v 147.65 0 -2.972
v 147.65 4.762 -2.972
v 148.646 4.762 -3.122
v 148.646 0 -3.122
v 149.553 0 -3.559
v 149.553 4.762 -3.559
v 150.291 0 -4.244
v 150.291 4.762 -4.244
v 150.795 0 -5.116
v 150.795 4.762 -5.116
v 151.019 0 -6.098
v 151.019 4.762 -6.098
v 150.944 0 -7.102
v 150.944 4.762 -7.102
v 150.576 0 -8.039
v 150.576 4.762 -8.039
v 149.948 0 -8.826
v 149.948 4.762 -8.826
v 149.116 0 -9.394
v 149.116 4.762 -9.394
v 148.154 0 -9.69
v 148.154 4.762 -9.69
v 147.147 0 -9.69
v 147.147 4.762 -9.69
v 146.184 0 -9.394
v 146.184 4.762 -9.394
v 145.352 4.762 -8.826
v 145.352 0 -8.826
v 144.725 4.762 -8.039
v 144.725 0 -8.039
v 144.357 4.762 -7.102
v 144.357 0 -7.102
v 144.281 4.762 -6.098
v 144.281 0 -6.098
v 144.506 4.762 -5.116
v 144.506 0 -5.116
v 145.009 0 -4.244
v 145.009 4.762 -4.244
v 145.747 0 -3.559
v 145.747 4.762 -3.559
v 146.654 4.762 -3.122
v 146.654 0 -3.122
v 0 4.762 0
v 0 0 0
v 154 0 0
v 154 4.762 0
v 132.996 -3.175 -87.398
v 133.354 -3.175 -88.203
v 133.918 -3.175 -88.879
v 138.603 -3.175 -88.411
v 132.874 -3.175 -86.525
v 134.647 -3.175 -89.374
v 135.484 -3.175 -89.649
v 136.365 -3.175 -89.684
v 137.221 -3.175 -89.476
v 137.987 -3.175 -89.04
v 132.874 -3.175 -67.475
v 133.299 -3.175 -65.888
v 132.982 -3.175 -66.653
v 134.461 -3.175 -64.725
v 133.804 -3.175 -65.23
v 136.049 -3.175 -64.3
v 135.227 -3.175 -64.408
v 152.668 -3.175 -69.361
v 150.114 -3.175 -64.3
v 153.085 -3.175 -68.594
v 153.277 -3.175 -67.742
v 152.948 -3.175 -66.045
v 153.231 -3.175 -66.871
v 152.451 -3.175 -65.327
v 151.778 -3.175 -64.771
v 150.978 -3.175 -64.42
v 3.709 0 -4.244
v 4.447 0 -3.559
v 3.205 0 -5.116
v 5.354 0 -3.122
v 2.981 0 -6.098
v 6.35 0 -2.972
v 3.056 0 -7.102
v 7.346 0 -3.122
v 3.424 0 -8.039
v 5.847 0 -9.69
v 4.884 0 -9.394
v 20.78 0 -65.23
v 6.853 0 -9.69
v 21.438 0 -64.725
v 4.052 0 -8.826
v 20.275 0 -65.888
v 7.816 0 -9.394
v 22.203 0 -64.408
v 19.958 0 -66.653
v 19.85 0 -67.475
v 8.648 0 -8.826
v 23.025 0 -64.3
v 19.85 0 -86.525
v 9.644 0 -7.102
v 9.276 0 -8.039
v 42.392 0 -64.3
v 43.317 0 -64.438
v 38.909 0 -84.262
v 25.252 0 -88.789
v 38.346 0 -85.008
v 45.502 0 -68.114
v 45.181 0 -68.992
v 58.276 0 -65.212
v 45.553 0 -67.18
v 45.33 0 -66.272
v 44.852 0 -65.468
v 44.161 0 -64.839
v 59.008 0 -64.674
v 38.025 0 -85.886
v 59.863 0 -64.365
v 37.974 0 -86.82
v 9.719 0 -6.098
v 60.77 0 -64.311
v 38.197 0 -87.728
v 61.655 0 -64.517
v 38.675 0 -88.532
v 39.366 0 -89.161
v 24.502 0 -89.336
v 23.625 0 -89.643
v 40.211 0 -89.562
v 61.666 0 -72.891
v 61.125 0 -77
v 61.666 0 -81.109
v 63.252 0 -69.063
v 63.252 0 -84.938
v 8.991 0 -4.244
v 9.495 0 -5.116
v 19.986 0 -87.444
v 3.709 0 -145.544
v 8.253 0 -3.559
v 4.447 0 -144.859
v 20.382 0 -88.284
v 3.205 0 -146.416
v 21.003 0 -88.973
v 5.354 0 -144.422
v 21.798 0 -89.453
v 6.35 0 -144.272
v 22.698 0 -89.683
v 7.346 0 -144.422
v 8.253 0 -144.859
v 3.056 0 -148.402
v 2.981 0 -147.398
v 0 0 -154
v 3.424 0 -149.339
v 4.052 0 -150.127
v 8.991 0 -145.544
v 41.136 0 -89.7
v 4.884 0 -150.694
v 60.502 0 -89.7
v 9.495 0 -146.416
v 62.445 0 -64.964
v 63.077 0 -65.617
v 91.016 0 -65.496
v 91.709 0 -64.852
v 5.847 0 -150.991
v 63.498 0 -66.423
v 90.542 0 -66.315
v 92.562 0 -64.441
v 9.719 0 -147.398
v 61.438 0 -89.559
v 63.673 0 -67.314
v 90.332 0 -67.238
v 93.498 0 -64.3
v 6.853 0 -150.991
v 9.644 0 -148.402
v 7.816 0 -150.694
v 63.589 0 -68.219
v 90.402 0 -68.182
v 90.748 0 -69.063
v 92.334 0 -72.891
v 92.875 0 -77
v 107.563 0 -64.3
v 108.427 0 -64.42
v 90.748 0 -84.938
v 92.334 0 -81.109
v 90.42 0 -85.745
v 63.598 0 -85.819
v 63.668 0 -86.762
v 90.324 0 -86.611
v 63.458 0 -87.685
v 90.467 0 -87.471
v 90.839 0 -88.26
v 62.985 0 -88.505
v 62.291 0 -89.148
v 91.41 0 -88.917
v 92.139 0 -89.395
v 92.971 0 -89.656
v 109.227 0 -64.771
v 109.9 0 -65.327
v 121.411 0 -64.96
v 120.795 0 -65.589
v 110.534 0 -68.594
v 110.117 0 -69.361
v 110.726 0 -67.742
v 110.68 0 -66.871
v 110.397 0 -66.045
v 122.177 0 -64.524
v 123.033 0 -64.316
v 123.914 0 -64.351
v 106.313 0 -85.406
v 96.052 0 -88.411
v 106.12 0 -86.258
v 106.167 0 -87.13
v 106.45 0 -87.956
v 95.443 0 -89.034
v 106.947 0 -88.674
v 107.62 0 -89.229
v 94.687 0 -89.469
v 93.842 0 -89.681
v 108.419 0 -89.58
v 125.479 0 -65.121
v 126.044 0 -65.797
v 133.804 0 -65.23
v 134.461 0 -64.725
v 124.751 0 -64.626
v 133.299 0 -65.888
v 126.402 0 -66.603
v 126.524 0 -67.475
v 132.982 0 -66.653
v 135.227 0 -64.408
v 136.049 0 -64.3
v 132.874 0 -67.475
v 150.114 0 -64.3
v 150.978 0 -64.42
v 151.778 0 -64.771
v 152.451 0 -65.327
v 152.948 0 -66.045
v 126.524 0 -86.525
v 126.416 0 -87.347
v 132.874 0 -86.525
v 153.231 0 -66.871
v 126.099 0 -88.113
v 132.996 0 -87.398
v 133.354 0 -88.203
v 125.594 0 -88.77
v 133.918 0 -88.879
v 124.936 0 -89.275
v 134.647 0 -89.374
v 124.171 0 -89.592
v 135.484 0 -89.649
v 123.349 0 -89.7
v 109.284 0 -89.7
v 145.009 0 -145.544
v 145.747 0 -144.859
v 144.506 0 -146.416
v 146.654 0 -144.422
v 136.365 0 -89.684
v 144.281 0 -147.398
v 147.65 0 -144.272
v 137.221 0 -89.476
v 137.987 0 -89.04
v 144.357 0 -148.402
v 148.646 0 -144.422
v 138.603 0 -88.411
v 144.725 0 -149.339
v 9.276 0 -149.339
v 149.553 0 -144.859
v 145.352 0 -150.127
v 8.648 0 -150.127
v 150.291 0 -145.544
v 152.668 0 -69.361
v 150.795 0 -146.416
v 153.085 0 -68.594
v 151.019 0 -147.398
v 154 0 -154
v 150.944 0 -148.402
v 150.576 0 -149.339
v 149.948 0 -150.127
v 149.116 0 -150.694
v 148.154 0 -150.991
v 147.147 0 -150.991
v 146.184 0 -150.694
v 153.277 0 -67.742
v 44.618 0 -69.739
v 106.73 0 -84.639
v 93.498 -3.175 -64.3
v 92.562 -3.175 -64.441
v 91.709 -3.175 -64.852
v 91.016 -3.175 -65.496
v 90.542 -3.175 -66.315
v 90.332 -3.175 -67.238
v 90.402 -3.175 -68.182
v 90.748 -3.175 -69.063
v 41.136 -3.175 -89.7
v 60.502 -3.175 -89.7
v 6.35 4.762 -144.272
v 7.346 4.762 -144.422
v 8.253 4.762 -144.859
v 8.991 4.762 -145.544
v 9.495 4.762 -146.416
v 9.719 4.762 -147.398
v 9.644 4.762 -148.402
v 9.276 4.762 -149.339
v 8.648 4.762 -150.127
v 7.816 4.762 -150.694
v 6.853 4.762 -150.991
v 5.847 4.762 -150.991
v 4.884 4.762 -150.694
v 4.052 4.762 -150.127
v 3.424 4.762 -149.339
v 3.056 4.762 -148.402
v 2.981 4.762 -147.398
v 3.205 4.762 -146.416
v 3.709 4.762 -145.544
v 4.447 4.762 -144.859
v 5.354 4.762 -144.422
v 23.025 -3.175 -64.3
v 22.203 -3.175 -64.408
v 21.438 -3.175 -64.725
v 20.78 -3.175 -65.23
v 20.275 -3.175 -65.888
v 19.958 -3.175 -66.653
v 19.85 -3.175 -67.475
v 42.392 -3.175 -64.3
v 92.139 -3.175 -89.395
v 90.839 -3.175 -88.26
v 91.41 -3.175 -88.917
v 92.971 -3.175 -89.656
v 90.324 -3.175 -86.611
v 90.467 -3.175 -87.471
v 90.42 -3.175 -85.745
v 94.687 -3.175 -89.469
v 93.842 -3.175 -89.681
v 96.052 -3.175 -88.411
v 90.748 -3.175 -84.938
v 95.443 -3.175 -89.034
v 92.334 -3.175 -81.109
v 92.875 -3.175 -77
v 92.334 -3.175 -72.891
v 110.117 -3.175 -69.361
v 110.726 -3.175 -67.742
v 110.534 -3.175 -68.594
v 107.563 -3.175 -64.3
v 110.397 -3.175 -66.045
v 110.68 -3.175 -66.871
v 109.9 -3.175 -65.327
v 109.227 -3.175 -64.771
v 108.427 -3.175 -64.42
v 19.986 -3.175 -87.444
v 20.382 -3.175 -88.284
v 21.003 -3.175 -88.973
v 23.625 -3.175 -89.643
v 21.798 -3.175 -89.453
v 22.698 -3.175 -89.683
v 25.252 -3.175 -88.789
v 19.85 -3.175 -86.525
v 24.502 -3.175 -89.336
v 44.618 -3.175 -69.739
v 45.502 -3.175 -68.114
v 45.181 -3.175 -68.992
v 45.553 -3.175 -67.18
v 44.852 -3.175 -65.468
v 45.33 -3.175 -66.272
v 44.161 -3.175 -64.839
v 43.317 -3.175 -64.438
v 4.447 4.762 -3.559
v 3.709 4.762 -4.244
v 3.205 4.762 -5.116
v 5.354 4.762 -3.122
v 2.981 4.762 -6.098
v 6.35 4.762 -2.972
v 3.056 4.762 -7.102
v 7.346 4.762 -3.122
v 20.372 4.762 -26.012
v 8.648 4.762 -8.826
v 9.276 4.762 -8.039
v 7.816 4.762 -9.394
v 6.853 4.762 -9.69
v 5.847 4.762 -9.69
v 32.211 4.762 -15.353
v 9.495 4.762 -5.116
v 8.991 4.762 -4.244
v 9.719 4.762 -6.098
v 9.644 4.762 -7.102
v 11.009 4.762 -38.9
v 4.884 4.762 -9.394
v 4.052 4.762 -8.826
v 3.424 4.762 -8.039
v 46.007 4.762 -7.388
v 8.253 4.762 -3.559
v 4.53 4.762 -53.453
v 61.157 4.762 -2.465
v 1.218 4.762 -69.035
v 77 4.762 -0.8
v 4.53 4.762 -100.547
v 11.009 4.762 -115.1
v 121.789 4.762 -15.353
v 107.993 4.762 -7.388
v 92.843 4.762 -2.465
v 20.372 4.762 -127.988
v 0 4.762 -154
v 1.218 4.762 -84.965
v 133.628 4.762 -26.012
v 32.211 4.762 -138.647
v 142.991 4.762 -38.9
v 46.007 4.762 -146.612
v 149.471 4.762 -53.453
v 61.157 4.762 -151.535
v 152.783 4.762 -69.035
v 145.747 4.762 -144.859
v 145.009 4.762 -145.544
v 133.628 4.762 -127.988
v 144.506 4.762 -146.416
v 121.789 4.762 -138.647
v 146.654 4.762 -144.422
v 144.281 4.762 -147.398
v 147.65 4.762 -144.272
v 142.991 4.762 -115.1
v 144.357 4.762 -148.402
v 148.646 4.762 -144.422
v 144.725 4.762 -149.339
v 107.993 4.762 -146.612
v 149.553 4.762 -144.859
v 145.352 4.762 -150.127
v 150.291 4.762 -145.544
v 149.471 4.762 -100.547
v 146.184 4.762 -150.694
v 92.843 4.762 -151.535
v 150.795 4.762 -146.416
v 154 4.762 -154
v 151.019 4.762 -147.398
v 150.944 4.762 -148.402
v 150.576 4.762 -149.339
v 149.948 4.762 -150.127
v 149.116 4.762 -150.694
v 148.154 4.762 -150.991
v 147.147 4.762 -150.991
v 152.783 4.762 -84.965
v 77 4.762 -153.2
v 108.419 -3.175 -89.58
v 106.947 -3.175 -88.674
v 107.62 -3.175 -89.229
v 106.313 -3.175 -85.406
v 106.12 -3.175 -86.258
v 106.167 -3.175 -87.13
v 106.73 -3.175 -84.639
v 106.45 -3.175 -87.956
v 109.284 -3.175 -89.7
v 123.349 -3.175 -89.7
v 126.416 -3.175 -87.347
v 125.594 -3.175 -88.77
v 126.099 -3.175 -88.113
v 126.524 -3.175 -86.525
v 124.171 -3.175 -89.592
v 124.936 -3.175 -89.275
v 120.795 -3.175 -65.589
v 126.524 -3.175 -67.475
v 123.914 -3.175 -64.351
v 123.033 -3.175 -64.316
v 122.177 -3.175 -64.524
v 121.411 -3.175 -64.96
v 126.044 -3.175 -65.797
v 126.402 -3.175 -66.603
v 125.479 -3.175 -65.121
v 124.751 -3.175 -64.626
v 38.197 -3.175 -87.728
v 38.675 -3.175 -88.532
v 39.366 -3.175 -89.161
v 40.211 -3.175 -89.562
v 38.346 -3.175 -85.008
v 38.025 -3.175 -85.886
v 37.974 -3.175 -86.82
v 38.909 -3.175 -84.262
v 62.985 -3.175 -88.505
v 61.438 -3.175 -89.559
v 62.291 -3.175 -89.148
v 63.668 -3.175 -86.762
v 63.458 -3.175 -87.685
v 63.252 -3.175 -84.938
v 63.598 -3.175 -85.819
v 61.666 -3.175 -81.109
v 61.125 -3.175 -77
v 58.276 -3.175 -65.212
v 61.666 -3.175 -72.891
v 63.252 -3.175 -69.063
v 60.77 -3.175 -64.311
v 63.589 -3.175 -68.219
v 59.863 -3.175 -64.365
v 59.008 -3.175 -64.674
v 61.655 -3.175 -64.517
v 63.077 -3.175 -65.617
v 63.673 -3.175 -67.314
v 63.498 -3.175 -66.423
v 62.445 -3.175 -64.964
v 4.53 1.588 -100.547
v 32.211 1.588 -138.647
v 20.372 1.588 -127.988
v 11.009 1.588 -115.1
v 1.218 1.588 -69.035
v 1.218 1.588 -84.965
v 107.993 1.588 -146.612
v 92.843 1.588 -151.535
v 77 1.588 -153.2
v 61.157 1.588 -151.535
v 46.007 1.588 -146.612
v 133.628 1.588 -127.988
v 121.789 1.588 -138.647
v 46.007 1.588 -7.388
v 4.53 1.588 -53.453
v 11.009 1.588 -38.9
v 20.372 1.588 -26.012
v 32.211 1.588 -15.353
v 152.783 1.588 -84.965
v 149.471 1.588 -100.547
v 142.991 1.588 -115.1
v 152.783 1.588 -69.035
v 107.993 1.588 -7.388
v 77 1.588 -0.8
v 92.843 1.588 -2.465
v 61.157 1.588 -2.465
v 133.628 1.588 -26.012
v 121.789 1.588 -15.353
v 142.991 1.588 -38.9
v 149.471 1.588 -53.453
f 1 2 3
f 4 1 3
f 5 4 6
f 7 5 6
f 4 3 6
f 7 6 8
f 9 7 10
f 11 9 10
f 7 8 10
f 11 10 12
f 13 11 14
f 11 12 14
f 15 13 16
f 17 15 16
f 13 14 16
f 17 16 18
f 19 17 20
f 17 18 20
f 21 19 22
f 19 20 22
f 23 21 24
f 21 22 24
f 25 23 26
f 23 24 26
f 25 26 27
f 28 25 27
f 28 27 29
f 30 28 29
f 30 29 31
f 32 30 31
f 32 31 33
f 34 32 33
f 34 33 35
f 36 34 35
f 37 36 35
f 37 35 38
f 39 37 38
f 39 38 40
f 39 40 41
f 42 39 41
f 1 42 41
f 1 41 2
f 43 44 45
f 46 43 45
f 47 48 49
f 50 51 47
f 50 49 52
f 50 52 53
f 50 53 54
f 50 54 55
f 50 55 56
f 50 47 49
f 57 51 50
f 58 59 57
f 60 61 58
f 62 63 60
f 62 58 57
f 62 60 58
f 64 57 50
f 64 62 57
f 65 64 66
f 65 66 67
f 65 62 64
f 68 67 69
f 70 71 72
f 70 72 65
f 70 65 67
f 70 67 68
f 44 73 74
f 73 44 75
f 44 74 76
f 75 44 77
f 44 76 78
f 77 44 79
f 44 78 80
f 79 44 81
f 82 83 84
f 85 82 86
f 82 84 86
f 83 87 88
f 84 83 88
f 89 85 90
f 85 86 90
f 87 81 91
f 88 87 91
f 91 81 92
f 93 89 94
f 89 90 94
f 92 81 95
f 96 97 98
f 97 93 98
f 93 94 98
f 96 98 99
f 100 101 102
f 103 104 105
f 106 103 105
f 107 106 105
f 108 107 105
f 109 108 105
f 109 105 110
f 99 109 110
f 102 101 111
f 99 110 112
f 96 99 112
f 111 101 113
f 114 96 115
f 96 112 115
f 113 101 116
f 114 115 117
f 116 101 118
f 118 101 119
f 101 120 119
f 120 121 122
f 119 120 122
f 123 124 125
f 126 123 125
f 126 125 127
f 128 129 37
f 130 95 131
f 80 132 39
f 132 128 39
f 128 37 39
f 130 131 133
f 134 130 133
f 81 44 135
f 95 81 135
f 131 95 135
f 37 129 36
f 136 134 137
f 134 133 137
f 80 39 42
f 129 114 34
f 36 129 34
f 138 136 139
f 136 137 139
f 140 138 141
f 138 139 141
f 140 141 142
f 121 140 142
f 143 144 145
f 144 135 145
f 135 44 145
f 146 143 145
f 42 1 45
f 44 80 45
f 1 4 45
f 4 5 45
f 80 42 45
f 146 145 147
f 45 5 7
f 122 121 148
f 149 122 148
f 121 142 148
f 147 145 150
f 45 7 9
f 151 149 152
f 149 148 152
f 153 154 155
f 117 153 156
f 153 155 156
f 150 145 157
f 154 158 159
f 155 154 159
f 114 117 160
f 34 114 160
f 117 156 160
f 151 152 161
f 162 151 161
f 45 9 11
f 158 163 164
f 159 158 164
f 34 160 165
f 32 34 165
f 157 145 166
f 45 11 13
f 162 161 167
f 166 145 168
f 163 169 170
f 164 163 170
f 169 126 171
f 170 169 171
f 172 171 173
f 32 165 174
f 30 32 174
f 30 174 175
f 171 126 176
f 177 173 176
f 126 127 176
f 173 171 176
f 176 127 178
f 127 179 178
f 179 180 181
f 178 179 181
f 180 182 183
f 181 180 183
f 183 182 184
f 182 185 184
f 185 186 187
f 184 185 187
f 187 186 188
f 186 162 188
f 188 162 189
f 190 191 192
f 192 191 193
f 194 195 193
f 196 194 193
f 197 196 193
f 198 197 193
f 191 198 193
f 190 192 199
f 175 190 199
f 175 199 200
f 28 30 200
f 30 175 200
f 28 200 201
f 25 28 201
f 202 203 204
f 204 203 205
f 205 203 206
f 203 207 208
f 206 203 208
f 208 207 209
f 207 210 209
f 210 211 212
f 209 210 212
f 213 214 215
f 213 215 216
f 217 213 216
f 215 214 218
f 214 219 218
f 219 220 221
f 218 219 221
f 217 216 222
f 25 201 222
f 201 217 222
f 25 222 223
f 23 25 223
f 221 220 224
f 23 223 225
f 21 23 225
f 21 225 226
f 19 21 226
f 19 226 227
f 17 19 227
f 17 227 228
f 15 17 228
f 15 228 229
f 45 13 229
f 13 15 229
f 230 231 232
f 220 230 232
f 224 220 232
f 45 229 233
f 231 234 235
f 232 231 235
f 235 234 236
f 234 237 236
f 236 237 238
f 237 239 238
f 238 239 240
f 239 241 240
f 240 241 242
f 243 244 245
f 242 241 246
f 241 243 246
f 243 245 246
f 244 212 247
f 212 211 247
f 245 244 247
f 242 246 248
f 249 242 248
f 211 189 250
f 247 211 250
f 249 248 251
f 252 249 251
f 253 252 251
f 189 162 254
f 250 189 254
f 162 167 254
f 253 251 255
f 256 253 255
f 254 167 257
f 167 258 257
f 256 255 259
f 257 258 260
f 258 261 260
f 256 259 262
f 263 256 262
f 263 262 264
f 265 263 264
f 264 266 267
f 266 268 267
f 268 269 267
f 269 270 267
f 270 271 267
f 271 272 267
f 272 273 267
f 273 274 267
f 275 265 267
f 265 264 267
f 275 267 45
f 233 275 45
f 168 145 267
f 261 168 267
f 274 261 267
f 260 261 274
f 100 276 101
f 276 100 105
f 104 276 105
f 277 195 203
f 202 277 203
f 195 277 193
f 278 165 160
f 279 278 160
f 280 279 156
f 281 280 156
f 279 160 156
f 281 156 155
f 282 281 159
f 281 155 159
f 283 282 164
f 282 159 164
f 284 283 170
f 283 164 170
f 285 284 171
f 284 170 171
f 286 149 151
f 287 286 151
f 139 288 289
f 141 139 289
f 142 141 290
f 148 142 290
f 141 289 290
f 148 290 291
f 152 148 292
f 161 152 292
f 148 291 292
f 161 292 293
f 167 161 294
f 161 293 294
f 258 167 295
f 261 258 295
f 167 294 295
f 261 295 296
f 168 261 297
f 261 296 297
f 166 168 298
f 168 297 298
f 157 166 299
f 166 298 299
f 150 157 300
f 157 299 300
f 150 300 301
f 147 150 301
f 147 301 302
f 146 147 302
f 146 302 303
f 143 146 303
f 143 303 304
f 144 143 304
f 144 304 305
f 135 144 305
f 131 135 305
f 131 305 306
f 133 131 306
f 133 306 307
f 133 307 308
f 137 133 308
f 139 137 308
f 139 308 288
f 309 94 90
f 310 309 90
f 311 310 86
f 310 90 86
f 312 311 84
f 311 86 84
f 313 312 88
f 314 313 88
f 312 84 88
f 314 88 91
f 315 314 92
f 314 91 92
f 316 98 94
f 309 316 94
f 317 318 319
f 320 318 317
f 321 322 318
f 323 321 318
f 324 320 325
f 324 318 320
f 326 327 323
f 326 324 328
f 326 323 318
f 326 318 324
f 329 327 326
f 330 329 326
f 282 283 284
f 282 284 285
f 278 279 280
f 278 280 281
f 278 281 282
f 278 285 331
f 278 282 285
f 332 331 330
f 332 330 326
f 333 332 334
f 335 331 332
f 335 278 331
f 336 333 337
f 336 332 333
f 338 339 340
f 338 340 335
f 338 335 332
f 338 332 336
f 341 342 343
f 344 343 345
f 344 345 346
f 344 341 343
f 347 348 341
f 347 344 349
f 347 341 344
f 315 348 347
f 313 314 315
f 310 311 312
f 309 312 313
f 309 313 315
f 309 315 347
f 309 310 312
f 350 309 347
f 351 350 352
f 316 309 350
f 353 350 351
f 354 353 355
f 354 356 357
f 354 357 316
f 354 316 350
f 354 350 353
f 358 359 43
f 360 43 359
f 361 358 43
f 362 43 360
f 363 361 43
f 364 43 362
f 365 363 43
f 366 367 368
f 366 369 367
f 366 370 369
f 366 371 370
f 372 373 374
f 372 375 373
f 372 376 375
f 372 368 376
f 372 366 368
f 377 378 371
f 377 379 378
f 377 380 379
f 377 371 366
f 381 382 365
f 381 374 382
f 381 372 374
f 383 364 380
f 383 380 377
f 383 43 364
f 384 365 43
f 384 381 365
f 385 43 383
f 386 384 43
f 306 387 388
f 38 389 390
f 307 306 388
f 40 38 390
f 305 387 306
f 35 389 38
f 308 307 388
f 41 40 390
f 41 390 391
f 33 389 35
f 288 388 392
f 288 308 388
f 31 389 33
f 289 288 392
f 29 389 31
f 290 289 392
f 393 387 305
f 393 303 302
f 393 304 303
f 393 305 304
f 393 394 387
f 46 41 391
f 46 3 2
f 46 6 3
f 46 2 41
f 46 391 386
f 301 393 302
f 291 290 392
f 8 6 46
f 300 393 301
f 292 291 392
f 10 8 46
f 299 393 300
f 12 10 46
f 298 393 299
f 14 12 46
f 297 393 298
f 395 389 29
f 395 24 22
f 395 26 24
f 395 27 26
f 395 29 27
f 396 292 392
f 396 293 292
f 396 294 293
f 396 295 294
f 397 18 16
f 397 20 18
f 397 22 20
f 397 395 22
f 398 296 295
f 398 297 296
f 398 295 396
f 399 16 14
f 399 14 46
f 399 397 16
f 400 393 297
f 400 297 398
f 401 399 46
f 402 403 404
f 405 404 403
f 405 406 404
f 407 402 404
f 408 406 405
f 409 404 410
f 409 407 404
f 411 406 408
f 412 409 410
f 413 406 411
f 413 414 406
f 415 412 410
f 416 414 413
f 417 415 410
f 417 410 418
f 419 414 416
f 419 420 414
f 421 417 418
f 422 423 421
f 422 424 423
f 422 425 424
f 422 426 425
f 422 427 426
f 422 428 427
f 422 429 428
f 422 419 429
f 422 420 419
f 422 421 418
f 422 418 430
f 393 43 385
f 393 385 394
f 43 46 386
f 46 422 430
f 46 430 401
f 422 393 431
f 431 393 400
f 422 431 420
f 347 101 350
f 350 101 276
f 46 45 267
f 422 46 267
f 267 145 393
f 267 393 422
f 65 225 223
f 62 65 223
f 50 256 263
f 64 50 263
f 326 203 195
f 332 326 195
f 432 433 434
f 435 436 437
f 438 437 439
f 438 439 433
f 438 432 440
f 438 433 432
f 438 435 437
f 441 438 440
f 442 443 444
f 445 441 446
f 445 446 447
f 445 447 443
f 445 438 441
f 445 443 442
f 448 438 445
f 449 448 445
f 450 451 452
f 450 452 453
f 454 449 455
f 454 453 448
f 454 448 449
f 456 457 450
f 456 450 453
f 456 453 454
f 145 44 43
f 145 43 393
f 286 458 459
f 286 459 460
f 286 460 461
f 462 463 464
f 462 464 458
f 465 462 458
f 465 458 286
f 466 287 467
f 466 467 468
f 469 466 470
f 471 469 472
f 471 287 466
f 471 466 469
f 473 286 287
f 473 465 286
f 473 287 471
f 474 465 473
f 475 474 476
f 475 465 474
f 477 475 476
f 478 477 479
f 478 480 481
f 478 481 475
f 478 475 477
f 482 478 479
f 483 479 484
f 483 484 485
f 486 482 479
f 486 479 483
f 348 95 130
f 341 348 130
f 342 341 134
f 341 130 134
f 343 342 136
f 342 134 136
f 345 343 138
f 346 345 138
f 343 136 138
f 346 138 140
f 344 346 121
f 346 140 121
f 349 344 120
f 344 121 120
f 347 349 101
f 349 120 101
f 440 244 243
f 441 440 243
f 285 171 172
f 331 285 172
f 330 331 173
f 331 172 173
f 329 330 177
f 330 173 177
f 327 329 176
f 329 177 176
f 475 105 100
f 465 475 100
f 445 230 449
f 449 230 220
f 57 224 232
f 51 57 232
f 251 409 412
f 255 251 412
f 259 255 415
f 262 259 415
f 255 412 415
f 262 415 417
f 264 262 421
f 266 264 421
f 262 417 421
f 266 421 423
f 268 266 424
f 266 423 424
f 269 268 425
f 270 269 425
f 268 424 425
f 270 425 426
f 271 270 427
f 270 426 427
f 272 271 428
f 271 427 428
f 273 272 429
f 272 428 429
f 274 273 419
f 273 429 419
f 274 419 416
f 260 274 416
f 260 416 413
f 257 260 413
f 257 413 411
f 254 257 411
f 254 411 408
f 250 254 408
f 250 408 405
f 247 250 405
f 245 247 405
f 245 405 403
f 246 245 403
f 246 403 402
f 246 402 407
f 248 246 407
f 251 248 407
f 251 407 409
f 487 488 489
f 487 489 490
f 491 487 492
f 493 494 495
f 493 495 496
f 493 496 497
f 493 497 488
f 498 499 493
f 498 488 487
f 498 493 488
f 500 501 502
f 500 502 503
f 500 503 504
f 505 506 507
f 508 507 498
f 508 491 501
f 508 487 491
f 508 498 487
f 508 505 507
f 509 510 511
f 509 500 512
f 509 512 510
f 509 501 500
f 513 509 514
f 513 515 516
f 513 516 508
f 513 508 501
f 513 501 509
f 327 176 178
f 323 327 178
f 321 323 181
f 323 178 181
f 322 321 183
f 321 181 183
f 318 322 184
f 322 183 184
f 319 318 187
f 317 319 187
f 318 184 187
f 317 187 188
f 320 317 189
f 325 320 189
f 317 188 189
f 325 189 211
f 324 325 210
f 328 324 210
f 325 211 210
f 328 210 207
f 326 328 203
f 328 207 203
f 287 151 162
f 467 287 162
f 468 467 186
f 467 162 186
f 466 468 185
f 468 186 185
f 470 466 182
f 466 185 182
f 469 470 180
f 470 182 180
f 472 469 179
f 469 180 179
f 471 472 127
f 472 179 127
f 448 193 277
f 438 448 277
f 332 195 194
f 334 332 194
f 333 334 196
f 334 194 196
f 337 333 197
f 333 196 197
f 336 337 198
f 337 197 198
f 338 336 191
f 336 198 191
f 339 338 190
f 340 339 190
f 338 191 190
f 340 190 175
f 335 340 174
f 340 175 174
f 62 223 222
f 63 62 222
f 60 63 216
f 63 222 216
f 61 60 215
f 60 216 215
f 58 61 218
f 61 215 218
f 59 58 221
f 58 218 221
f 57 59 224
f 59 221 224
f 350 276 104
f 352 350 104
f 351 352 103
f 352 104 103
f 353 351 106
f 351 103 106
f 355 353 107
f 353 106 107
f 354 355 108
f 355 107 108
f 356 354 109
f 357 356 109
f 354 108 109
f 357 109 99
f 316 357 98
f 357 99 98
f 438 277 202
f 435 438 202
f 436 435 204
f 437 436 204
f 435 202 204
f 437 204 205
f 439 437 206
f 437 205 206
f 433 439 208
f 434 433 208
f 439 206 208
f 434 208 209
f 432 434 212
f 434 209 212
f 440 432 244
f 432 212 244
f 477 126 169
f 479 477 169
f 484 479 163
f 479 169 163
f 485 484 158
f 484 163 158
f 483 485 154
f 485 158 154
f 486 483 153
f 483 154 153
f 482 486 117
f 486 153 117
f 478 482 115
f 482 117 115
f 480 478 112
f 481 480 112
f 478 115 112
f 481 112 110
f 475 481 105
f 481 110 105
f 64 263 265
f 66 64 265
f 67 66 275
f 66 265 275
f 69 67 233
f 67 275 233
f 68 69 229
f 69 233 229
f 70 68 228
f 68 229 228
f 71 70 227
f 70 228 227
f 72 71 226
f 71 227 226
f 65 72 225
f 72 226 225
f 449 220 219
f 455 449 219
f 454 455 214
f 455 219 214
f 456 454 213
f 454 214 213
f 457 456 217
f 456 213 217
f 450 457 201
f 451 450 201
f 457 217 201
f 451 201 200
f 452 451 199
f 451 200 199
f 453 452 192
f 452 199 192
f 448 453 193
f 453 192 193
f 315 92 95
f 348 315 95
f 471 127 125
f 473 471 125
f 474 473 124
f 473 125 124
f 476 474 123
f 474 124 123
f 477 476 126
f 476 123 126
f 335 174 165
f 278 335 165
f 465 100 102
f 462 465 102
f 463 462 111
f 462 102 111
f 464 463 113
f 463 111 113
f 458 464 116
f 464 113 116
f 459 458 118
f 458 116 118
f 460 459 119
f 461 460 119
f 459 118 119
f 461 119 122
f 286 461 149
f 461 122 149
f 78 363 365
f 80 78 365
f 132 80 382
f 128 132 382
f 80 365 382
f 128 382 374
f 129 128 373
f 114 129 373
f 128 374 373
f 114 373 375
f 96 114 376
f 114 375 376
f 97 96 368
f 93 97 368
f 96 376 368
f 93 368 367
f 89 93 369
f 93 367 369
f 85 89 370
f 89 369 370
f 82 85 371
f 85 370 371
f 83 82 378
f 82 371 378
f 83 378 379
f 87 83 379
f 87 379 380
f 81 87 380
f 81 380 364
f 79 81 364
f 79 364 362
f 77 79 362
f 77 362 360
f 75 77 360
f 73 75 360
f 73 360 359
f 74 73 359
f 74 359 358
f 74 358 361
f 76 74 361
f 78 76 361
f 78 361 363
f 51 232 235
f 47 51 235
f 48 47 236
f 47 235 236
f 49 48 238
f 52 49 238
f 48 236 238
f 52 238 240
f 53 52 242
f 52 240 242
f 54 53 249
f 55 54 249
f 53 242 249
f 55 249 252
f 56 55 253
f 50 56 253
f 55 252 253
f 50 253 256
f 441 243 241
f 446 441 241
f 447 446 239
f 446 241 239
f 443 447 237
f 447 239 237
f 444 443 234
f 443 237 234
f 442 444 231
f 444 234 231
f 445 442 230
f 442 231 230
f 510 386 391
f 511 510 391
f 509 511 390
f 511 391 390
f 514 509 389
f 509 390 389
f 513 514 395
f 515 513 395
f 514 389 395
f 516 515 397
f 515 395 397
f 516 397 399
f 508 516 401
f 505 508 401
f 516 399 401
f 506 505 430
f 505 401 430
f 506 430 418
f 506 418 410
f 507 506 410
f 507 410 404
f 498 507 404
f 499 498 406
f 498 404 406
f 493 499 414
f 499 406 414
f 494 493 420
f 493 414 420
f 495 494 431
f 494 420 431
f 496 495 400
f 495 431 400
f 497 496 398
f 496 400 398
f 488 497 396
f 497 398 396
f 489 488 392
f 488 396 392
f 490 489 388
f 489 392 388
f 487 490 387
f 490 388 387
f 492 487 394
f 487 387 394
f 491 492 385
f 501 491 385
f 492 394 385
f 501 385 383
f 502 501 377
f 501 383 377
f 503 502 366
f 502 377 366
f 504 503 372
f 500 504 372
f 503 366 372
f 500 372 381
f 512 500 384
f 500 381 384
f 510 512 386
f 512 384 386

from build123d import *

# Parameters (mm, degrees)
SKETCH2_W           = 154.0002
SKETCH2_H           = 154.0002
BOSS_EXTRUDE1_DEPTH = 4.7625
SKETCH4_R           = 76.2
CUT_EXTRUDE1_DEPTH  = 3.175
SKETCH5_R           = 3.3782
CUT_EXTRUDE2_DEPTH  = 218.841237158
BOSS_EXTRUDE2_DEPTH = 3.175


with BuildPart() as part:
    # Sketch2 → Boss-Extrude1 (new body)
    with BuildSketch(Plane(origin=(0, 0, 0), x_dir=(1, 0, 0), z_dir=(0, 1, 0))):
        with Locations((77.0001, 77.0001)):
            Rectangle(SKETCH2_W, SKETCH2_H)
    extrude(amount=BOSS_EXTRUDE1_DEPTH)

    # Sketch4 → Cut-Extrude1 (cut)
    with BuildSketch(Plane(origin=(0, 4.7625, 0), x_dir=(1, 0, 0), z_dir=(0, 1, 0))):
        with Locations(Location((77.0001, 77.0001, 0), (0, 0, 270))):
            Circle(SKETCH4_R)
    extrude(amount=-CUT_EXTRUDE1_DEPTH, mode=Mode.SUBTRACT)

    # Sketch5 → Cut-Extrude2 (cut, through all)
    with BuildSketch(Plane(origin=(0, 4.7625, 0), x_dir=(1, 0, 0), z_dir=(0, 1, 0))):
        with Locations(Location((6.35, 6.35, 0), (0, 0, 270))):
            Circle(SKETCH5_R)
        with Locations(Location((6.35, 147.6502, 0), (0, 0, 270))):
            Circle(SKETCH5_R)
        with Locations(Location((147.6502, 147.6502, 0), (0, 0, 270))):
            Circle(SKETCH5_R)
        with Locations(Location((147.6502, 6.35, 0), (0, 0, 270))):
            Circle(SKETCH5_R)
    extrude(amount=-CUT_EXTRUDE2_DEPTH, mode=Mode.SUBTRACT)

    # Sketch7 → Boss-Extrude2 (add)
    with BuildSketch(Plane.XZ):
        with BuildLine():
            Line((109.284213593, -89.700088814), (123.348971479, -89.700088814))
            ThreePointArc((123.348971479, -89.700088814), (125.59403551, -88.770152844), (126.523971479, -86.525088814))
            Line((126.523971479, -86.525088814), (126.523971479, -67.475088814))
            ThreePointArc((126.523971479, -67.475088814), (124.341654203, -64.459262889), (120.794707851, -65.589256818))
            Line((120.794707851, -65.589256818), (106.729949965, -84.639256818))
            ThreePointArc((106.729949965, -84.639256818), (106.449769946, -87.955667091), (109.284213593, -89.700088814))
        make_face()
        with BuildLine():
            Line((150.113729365, -64.300088814), (136.048971479, -64.300088814))
            ThreePointArc((136.048971479, -64.300088814), (133.803907449, -65.230024784), (132.873971479, -67.475088814))
            Line((132.873971479, -67.475088814), (132.873971479, -86.525088814))
            ThreePointArc((132.873971479, -86.525088814), (135.056288756, -89.540914739), (138.603235108, -88.410920809))
            Line((138.603235108, -88.410920809), (152.667992994, -69.360920809))
            ThreePointArc((152.667992994, -69.360920809), (152.948173013, -66.044510537), (150.113729365, -64.300088814))
        make_face()
        with BuildLine():
            Line((96.052127079, -88.410920809), (110.116884965, -69.360920809))
            ThreePointArc((110.116884965, -69.360920809), (110.397064984, -66.044510537), (107.562621336, -64.300088814))
            Line((107.562621336, -64.300088814), (93.49786345, -64.300088814))
            ThreePointArc((93.49786345, -64.300088814), (90.748232793, -65.887588814), (90.748232793, -69.062588814))
            ThreePointArc((90.748232793, -69.062588814), (92.875079508, -77.000088814), (90.748232793, -84.937588814))
            ThreePointArc((90.748232793, -84.937588814), (91.758452384, -89.181227768), (96.052127079, -88.410920809))
        make_face()
        with BuildLine():
            Line((25.251556253, -88.788587501), (44.618320403, -69.738587501))
            ThreePointArc((44.618320403, -69.738587501), (45.330145322, -66.272172219), (42.391843659, -64.300088814))
            Line((42.391843659, -64.300088814), (23.025079508, -64.300088814))
            ThreePointArc((23.025079508, -64.300088814), (20.780015478, -65.230024784), (19.850079508, -67.475088814))
            Line((19.850079508, -67.475088814), (19.850079508, -86.525088814))
            ThreePointArc((19.850079508, -86.525088814), (21.797976958, -89.453372327), (25.251556253, -88.788587501))
        make_face()
        with BuildLine():
            Line((58.275818822, -65.211590127), (38.909054672, -84.261590127))
            ThreePointArc((38.909054672, -84.261590127), (38.197229752, -87.728005409), (41.135531416, -89.700088814))
            Line((41.135531416, -89.700088814), (60.502295566, -89.700088814))
            ThreePointArc((60.502295566, -89.700088814), (63.251926223, -88.112588814), (63.251926223, -84.937588814))
            ThreePointArc((63.251926223, -84.937588814), (61.125079508, -77.000088814), (63.251926223, -69.062588814))
            ThreePointArc((63.251926223, -69.062588814), (62.445481153, -64.964181652), (58.275818822, -65.211590127))
        make_face()
    extrude(amount=BOSS_EXTRUDE2_DEPTH)


solid = part.part
